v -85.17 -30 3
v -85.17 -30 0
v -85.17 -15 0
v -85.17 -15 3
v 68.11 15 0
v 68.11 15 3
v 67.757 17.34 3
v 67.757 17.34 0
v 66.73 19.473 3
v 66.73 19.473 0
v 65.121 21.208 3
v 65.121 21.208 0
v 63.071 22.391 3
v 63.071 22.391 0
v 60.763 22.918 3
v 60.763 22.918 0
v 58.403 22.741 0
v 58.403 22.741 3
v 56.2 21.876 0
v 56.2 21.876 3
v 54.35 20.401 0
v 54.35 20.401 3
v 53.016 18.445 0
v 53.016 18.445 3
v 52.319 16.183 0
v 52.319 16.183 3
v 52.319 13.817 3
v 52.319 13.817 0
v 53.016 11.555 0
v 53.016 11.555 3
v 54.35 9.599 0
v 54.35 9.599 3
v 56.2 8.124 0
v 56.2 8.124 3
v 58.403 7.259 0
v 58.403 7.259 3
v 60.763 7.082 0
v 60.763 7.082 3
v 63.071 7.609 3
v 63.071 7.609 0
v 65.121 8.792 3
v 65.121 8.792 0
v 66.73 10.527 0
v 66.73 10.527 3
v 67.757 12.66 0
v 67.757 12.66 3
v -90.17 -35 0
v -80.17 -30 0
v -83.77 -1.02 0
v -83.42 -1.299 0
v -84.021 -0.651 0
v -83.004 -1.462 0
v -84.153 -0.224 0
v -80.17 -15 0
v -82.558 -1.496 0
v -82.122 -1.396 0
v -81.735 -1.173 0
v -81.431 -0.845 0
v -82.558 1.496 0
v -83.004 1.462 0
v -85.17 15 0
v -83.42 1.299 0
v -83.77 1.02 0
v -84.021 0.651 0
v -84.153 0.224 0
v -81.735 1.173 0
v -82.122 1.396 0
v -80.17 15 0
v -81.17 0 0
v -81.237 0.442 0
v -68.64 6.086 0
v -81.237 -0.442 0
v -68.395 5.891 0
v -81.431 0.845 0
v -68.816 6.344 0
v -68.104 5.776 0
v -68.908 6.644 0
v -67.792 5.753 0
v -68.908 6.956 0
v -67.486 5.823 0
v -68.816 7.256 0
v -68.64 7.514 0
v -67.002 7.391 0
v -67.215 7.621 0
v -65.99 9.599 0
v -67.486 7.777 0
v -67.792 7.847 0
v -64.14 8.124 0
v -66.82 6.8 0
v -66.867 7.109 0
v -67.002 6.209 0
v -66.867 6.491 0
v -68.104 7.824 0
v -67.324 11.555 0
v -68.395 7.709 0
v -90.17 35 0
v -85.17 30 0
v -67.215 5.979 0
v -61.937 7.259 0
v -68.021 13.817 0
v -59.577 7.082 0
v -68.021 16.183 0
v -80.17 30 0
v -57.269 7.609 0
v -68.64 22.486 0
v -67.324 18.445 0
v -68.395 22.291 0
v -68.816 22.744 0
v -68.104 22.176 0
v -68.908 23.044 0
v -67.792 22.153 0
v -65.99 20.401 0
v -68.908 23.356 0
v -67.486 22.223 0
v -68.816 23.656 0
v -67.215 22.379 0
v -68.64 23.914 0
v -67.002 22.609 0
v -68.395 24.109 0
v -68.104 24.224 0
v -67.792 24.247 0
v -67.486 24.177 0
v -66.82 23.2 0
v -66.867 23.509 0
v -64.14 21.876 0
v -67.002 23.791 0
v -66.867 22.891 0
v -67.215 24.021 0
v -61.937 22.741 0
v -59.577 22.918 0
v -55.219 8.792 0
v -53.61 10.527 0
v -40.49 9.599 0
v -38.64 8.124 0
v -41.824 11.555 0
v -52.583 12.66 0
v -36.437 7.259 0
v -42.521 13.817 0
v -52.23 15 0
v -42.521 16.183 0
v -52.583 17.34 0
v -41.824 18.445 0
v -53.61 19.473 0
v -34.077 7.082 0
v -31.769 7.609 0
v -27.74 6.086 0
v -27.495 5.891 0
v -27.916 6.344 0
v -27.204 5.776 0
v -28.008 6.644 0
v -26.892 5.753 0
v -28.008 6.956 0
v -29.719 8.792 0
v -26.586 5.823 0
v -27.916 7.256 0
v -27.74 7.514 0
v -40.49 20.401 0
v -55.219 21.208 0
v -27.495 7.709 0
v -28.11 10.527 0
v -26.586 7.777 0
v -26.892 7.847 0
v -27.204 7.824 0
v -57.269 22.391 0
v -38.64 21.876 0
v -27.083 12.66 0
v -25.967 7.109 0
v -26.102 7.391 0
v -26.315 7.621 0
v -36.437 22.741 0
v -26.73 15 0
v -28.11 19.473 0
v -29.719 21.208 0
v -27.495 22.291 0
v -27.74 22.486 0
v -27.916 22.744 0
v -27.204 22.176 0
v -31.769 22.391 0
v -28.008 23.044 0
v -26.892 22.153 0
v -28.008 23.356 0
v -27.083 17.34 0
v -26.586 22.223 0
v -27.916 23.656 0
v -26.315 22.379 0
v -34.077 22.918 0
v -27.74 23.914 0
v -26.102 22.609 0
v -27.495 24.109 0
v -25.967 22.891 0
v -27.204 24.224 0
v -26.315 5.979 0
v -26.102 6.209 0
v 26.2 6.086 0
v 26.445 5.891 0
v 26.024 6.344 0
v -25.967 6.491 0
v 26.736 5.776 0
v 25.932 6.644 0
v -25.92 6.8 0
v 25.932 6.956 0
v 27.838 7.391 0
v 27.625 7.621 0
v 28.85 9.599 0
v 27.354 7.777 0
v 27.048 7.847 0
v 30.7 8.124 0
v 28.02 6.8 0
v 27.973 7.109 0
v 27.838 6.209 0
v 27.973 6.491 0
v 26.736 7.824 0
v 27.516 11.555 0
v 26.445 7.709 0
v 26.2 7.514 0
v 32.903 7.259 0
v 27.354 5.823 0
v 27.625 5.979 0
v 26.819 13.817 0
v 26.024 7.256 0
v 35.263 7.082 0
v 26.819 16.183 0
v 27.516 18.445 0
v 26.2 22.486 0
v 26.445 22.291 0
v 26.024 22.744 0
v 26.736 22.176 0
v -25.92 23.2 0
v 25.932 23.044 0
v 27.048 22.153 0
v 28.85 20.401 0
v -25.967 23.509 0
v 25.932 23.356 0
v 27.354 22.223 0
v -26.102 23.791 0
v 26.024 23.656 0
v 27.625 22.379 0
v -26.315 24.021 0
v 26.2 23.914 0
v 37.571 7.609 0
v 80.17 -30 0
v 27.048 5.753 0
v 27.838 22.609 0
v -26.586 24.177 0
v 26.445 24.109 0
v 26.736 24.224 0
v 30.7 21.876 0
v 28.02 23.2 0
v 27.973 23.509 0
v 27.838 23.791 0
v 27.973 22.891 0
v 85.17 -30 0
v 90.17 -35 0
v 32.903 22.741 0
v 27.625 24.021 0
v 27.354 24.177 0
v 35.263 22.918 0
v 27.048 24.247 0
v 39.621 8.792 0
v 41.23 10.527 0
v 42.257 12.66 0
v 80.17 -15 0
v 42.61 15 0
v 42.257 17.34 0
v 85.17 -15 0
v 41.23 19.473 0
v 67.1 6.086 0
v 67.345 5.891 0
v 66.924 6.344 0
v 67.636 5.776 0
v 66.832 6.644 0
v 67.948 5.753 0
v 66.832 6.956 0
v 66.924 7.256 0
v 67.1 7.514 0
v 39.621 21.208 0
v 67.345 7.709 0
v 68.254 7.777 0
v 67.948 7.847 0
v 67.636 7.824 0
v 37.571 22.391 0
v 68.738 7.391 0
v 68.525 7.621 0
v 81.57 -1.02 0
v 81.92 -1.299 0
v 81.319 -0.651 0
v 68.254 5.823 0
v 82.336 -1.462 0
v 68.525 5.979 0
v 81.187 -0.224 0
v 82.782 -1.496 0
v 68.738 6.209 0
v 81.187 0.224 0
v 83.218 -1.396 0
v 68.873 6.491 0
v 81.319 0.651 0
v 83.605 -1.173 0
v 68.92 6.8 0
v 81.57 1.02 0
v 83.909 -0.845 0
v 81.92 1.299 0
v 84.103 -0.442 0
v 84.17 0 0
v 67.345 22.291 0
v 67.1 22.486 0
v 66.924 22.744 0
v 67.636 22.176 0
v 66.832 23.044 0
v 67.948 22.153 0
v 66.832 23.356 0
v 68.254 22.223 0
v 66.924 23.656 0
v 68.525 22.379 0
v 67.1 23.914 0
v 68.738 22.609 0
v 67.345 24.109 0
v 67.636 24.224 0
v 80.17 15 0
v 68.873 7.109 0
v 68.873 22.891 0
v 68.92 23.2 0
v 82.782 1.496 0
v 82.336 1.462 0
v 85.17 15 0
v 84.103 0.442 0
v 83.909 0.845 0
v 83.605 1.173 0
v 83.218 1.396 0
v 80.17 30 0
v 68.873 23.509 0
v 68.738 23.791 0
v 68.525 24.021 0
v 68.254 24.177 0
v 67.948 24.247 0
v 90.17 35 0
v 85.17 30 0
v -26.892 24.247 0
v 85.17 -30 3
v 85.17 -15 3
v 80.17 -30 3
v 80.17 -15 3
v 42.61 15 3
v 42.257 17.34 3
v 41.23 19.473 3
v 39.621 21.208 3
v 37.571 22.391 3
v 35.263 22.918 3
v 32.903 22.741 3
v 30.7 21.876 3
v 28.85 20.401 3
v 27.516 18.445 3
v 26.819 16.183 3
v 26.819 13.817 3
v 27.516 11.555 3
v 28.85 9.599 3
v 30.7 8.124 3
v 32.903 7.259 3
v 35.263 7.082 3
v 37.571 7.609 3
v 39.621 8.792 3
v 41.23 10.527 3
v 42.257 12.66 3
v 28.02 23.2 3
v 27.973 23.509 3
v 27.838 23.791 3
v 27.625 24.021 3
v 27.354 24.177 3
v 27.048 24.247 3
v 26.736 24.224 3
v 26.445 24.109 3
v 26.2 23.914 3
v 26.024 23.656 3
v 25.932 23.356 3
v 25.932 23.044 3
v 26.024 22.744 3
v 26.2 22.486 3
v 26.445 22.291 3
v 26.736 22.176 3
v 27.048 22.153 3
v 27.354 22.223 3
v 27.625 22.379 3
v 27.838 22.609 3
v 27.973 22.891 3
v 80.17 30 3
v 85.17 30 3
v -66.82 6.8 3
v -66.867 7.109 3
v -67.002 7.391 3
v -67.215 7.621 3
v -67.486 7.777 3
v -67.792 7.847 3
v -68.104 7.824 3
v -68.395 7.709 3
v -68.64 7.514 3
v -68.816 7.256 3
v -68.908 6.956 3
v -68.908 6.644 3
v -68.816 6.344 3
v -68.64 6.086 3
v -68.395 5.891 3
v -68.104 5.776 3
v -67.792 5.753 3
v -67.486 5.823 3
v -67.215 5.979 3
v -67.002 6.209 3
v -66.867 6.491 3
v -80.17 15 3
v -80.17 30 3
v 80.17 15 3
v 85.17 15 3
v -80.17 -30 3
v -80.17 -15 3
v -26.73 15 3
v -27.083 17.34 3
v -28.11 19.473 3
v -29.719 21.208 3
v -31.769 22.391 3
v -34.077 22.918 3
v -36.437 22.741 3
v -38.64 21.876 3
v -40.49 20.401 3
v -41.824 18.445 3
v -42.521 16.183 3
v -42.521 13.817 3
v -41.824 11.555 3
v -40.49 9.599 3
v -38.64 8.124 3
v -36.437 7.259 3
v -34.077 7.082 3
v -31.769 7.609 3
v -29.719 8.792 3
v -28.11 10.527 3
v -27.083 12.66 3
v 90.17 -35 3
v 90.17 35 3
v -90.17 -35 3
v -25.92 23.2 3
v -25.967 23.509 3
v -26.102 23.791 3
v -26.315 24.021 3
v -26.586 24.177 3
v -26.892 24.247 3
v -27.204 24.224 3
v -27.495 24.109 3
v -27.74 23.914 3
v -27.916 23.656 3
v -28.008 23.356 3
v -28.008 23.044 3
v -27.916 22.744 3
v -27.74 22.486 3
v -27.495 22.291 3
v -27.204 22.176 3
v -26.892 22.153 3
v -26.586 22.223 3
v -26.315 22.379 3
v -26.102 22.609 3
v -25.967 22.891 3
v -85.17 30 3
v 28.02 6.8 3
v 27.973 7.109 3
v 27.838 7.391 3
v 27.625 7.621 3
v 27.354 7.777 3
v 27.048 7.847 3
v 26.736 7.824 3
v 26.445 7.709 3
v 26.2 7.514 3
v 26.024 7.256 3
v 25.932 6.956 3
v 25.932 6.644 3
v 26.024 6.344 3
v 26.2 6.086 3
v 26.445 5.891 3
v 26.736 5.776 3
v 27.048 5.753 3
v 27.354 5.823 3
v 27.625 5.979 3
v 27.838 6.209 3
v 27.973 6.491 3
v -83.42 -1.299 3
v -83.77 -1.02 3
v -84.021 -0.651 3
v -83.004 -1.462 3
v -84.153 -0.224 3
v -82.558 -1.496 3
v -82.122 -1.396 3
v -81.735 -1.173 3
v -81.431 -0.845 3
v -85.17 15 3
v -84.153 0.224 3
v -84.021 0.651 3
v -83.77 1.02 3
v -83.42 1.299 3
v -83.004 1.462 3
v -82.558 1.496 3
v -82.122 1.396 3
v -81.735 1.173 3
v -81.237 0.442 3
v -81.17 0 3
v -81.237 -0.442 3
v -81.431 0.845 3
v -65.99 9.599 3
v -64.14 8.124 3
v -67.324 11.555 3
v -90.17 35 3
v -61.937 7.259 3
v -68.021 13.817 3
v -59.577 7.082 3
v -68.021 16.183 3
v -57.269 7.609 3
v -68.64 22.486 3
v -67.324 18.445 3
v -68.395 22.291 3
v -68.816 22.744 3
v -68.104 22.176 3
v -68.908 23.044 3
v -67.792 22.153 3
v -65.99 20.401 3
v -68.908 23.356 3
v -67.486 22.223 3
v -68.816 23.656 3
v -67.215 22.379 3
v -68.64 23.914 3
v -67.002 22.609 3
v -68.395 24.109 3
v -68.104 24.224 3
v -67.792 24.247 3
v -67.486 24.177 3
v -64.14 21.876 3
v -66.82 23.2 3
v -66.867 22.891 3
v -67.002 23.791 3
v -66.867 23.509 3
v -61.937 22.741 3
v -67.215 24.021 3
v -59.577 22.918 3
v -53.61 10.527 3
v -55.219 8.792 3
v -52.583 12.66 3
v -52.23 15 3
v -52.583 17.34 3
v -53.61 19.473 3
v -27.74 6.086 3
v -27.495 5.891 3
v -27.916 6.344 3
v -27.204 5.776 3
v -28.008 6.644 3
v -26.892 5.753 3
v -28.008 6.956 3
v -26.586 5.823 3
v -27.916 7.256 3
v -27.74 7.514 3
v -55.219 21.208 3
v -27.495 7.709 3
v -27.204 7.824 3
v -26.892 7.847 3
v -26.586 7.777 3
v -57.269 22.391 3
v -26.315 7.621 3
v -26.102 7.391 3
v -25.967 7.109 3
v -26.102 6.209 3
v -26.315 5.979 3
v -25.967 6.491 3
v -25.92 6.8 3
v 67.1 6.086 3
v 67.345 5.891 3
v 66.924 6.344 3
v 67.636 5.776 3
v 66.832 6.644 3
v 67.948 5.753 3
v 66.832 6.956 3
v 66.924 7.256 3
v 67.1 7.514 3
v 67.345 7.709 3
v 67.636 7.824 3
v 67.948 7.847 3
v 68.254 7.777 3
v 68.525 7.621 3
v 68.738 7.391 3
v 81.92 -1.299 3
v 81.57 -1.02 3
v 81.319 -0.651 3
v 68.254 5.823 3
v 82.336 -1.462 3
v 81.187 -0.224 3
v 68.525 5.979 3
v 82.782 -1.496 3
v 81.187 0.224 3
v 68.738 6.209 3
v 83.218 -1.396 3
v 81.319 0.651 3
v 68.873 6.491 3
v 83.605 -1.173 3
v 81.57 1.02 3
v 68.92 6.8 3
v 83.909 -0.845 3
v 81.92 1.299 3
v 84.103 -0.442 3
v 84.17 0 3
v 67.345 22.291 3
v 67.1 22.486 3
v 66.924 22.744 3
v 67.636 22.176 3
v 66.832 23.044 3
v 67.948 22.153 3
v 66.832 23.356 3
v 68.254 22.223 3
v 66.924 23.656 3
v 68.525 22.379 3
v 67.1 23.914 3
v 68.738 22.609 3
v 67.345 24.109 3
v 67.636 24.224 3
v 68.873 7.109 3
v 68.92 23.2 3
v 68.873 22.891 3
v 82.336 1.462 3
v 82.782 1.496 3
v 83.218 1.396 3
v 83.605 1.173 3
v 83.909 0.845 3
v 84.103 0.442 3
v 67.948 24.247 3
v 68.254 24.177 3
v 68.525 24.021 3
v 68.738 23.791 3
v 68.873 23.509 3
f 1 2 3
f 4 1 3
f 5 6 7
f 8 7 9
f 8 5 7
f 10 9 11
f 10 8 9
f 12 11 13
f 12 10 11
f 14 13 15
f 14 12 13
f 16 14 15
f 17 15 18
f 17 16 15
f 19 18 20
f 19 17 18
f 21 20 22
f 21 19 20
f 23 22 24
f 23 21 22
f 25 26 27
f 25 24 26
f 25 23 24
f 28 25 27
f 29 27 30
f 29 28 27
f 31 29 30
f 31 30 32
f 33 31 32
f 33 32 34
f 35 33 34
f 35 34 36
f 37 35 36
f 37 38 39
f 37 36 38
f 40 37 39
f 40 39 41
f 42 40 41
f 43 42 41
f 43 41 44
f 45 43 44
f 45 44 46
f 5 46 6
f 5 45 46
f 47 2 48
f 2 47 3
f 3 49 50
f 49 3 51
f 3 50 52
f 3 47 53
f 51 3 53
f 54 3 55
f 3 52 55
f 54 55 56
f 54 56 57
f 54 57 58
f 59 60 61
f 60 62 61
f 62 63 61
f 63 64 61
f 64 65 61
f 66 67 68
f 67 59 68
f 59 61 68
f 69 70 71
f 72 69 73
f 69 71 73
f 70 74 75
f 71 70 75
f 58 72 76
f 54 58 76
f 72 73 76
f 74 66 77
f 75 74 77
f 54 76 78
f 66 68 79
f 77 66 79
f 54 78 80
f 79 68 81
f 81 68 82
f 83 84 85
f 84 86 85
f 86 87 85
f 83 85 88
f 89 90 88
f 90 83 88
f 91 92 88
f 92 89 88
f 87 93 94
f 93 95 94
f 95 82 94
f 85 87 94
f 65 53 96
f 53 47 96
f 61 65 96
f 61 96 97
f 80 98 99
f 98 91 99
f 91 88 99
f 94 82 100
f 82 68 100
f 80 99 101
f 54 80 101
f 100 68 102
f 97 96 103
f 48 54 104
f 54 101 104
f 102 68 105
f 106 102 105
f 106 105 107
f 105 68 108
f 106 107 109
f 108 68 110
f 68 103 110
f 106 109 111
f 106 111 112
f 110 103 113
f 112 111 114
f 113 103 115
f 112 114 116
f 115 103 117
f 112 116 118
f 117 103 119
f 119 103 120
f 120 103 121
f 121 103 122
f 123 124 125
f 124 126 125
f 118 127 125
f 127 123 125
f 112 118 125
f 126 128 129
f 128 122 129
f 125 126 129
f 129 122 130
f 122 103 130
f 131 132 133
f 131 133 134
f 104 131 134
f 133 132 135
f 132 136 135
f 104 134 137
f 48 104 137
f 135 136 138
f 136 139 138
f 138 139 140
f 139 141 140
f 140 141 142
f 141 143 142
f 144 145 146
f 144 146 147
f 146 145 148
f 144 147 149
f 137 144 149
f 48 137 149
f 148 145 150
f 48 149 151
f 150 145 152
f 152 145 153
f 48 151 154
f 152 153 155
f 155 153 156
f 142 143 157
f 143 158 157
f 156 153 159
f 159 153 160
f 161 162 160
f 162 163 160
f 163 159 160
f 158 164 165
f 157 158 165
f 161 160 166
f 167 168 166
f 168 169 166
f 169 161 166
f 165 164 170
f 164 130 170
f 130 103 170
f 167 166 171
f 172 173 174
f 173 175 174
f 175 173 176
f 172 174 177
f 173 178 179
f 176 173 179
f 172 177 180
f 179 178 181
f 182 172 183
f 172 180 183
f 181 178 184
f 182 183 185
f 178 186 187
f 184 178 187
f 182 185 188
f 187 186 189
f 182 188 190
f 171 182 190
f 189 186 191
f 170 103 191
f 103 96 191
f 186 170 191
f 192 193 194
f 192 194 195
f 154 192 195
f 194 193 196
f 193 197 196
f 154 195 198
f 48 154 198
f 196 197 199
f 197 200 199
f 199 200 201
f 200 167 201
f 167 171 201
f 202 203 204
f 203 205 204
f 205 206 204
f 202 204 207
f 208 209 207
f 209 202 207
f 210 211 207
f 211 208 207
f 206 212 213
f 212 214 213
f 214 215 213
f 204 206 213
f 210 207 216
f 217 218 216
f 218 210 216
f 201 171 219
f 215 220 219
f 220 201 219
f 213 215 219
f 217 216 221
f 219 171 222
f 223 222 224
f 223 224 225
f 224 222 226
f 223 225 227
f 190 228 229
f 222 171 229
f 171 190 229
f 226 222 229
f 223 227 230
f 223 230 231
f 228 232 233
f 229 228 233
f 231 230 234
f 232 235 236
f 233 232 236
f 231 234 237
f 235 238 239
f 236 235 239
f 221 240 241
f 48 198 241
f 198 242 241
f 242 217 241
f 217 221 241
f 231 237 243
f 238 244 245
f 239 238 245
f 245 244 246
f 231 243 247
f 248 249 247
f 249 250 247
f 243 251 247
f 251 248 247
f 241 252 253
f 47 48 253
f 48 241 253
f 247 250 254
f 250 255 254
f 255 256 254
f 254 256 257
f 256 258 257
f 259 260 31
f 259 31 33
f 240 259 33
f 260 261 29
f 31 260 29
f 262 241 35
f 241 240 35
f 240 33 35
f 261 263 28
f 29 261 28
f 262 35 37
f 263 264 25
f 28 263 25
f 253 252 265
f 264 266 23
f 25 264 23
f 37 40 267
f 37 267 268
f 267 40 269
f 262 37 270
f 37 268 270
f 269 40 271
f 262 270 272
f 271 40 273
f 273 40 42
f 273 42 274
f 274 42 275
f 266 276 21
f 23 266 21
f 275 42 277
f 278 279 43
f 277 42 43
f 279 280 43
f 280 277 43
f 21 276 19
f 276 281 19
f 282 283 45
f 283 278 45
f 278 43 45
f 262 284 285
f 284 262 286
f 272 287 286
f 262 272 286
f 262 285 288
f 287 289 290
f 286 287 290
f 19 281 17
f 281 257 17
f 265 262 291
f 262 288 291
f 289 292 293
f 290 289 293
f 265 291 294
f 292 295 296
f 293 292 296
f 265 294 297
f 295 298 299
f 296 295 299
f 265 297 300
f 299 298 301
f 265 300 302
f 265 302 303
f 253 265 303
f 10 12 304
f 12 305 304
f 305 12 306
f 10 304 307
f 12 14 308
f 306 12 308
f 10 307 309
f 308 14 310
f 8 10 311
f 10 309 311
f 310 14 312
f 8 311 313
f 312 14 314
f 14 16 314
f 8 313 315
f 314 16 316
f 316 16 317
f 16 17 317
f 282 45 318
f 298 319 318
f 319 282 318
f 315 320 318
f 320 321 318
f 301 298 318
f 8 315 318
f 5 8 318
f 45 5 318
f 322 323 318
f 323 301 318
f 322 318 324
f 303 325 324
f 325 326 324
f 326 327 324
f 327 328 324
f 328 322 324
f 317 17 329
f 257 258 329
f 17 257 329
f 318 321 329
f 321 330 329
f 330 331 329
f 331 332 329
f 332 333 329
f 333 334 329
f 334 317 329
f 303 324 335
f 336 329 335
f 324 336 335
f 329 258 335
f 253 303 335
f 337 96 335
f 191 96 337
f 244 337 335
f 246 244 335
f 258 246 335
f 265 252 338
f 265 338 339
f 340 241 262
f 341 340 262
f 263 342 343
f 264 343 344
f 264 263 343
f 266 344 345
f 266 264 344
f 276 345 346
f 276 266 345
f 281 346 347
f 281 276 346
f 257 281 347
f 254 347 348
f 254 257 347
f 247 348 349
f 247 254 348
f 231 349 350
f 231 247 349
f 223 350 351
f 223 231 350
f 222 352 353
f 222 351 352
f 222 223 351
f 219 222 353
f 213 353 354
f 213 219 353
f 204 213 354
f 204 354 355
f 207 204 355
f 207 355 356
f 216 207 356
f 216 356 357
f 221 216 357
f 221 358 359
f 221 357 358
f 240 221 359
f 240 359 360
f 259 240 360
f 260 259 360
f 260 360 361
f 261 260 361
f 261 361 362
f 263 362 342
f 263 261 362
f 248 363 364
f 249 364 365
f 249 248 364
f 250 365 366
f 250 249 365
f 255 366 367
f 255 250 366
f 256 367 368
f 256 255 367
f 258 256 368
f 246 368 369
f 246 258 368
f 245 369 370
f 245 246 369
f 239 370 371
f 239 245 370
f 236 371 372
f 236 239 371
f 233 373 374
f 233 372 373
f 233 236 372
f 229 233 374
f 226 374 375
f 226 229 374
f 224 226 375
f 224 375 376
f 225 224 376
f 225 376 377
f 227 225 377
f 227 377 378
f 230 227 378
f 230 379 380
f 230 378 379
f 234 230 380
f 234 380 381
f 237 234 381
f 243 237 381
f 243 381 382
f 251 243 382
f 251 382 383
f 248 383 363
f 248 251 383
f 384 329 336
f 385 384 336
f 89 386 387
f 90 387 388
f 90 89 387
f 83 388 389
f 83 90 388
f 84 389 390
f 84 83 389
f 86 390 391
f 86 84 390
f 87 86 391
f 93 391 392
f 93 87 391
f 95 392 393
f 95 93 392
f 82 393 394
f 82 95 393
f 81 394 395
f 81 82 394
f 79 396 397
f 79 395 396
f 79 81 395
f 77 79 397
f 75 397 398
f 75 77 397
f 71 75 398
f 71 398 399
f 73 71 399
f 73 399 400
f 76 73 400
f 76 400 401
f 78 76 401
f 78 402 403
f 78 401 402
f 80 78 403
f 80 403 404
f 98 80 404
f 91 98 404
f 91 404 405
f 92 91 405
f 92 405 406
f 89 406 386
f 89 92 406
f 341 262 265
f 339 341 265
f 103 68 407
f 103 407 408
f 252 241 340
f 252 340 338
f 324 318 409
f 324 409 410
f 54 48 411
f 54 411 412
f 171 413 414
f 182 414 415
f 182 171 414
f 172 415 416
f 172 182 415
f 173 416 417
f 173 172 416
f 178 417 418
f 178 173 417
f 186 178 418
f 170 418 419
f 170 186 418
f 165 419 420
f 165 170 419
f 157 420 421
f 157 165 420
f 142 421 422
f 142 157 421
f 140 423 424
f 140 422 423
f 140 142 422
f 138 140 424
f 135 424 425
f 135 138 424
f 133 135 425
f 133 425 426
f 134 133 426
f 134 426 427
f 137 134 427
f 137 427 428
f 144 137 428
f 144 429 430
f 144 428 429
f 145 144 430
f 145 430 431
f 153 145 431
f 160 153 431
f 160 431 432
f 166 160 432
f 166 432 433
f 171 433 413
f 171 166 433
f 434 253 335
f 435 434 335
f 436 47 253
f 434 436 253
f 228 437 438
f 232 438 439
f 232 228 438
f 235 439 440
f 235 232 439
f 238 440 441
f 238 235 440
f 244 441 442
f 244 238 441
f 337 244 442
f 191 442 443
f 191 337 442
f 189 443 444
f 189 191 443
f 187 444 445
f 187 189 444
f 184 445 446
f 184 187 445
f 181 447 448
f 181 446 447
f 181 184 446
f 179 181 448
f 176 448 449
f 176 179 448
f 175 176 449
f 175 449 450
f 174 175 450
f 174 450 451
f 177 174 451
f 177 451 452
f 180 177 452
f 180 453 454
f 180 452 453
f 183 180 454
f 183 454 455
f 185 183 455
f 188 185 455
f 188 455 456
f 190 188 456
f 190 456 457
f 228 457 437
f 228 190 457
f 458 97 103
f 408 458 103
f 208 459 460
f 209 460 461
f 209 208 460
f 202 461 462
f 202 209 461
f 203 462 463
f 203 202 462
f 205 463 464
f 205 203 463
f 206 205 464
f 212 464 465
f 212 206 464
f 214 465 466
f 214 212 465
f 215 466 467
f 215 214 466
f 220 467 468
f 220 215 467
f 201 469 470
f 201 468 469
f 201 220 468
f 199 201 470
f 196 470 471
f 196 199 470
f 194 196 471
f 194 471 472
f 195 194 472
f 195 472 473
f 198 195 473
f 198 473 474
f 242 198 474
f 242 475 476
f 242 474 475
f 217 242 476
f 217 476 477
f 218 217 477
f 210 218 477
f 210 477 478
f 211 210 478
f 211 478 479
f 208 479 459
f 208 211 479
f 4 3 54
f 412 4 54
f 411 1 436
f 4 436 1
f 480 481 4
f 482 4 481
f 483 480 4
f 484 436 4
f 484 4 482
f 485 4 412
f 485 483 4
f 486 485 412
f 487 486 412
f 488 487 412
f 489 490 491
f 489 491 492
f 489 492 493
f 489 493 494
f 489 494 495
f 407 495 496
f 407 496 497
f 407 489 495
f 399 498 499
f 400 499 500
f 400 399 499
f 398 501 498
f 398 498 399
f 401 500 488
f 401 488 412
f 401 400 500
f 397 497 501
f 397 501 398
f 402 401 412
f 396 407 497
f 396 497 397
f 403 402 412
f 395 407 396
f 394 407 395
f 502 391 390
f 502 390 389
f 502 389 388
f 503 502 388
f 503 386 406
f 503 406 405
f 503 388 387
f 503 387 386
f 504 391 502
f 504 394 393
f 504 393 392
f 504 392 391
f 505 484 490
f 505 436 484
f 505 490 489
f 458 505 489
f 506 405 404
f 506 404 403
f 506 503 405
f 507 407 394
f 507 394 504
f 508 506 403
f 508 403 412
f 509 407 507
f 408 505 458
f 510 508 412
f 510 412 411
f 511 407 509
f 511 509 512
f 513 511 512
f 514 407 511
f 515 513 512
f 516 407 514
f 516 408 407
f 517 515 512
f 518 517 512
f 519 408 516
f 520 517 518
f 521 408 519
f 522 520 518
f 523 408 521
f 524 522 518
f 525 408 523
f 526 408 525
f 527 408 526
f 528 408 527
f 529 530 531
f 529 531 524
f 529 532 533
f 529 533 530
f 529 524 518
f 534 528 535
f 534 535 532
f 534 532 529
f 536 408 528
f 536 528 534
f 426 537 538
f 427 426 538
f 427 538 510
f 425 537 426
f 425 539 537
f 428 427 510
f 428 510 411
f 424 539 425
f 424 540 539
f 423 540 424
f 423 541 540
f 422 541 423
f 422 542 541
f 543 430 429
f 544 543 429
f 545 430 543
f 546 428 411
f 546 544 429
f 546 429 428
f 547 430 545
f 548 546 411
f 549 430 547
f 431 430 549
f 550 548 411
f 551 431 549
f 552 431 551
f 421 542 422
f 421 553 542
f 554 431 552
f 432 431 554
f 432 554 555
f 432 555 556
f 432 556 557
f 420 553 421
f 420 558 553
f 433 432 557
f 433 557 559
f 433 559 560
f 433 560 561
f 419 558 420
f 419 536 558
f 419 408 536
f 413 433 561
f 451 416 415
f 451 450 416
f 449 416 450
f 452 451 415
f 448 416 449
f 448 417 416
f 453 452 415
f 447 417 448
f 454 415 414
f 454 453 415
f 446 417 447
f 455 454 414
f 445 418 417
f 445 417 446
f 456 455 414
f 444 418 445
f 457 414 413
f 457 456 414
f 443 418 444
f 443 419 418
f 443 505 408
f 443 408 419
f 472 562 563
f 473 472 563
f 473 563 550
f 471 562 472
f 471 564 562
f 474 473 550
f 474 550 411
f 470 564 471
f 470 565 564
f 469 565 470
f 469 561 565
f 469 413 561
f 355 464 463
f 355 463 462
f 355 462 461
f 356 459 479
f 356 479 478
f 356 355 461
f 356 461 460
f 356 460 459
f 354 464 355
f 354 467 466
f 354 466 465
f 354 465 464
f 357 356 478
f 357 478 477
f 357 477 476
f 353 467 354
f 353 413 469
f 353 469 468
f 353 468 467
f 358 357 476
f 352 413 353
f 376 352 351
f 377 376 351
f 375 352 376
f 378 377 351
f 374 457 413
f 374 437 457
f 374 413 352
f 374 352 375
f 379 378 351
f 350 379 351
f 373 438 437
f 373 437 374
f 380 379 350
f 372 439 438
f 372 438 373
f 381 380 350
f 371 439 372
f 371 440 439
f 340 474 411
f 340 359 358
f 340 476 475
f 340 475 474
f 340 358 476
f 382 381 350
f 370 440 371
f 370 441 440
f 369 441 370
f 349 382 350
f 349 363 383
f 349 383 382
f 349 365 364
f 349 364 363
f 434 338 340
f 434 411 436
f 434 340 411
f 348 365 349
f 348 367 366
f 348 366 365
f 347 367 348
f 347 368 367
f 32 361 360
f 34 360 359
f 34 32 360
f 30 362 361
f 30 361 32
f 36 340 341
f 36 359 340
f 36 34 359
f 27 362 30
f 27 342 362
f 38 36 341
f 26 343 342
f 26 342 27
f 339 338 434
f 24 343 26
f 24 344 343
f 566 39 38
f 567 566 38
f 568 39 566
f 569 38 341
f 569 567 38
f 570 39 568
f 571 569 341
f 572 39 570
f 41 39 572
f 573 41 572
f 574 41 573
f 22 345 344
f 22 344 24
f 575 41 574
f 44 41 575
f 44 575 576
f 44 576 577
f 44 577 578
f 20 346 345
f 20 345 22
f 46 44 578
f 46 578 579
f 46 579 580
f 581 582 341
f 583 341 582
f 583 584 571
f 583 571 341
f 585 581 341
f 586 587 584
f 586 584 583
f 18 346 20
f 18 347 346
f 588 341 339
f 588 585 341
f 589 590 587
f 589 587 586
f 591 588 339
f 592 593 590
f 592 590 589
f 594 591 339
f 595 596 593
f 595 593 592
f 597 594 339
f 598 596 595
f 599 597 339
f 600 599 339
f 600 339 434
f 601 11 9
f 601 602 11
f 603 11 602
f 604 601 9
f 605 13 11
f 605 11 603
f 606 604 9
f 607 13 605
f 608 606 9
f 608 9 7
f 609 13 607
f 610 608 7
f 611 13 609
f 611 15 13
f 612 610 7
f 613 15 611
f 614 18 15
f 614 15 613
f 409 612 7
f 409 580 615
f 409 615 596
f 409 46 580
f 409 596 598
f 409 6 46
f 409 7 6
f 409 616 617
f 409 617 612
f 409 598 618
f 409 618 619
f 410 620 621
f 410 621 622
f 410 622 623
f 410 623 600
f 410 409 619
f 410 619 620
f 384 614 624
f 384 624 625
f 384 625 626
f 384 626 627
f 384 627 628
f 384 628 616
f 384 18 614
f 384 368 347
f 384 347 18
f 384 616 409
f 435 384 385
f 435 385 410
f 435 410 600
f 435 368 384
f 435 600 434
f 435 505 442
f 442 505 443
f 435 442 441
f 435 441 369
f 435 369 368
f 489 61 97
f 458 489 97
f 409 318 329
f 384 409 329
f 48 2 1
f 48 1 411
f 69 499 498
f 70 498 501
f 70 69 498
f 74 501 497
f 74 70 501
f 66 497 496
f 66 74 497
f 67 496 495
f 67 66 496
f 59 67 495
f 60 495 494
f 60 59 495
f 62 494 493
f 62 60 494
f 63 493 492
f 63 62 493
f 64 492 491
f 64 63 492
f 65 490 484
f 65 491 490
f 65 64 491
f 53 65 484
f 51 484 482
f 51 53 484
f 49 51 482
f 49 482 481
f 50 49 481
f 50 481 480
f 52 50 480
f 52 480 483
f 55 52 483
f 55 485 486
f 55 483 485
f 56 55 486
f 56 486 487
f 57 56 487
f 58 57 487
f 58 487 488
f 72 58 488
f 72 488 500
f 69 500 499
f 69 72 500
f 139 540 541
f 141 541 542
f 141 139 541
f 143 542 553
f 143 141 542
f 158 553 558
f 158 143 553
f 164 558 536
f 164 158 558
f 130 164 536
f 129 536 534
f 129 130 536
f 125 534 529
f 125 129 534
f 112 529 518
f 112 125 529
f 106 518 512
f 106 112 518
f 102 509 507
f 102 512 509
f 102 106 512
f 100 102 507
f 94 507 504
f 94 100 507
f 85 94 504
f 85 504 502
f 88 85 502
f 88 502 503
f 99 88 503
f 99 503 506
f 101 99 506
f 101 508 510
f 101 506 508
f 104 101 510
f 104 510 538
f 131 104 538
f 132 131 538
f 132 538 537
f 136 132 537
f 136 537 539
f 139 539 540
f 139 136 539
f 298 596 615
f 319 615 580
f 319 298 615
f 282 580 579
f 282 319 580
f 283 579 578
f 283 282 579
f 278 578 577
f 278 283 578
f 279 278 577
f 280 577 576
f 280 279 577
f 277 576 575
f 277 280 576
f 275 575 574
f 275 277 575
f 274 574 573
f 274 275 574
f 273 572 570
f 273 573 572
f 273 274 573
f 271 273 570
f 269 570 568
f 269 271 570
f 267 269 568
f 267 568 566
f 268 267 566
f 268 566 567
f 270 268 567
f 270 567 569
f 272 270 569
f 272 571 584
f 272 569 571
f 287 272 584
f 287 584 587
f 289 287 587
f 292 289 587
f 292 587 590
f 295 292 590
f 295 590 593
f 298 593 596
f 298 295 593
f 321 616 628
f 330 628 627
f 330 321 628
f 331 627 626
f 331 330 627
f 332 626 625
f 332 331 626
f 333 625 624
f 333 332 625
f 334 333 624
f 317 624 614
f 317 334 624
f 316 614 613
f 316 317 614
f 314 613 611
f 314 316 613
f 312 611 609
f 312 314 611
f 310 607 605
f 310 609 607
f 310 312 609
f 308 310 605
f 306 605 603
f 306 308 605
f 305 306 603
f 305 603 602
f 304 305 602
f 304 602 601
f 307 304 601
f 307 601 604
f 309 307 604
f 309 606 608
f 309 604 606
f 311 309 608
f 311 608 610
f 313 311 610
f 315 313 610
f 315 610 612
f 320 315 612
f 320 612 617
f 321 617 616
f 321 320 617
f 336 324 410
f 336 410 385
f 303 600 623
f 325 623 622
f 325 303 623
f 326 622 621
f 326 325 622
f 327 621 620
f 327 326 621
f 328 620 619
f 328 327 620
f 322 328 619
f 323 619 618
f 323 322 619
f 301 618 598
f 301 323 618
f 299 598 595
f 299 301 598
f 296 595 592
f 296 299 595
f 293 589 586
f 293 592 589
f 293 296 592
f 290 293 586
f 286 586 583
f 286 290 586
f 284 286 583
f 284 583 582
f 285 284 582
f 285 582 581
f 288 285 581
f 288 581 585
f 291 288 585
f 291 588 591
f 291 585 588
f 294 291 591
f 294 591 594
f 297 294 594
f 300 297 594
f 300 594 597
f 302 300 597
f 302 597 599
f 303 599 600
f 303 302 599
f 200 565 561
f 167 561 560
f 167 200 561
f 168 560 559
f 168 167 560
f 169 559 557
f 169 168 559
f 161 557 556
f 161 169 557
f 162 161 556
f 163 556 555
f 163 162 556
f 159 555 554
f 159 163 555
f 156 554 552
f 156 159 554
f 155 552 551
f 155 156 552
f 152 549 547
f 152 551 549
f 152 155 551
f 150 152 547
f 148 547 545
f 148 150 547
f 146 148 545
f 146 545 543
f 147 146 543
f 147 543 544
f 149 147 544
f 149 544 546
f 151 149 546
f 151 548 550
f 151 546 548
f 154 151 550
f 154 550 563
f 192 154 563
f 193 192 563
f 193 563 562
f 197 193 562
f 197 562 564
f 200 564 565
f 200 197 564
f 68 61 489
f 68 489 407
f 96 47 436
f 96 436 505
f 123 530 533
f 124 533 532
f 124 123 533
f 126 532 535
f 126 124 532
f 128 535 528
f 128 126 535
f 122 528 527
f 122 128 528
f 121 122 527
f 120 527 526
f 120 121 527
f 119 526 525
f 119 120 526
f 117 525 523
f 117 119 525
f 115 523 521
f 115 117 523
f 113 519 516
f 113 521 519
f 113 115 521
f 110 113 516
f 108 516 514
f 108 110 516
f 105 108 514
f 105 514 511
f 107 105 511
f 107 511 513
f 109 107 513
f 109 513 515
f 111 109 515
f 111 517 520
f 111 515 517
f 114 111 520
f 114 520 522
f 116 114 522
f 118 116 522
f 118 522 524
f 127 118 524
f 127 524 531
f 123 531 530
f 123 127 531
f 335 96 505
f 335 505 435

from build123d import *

# Parameters (mm, degrees)
SCHIZZO1_W                   = 180.34
SCHIZZO1_H                   = 70
ESTRUSIONE_ESTRUSIONE1_DEPTH = 3
SCHIZZO2_R                   = 1.5
SCHIZZO2_W                   = 5
SCHIZZO2_H                   = 15
TAGLIO_ESTRUSIONE1_DEPTH     = 4
SCHIZZO3_R                   = 7.94
SCHIZZO3_R_2                 = 1.05
TAGLIO_ESTRUSIONE2_DEPTH     = 4


with BuildPart() as part:
    # Schizzo1 → Estrusione-Estrusione1 (new body)
    with BuildSketch(Plane.XY):
        Rectangle(SCHIZZO1_W, SCHIZZO1_H)
    extrude(amount=ESTRUSIONE_ESTRUSIONE1_DEPTH)

    # Schizzo2 → Taglio-Estrusione1 (cut, through all)
    with BuildSketch(Plane.XY):
        with Locations((-82.67, 0)):
            Circle(SCHIZZO2_R)
        with Locations((82.67, 0)):
            Circle(SCHIZZO2_R)
        with Locations((-82.67, 22.5)):
            Rectangle(SCHIZZO2_W, SCHIZZO2_H)
        with Locations((-82.67, -22.5)):
            Rectangle(SCHIZZO2_W, SCHIZZO2_H)
        with Locations((82.67, 22.5)):
            Rectangle(SCHIZZO2_W, SCHIZZO2_H)
        with Locations((82.67, -22.5)):
            Rectangle(SCHIZZO2_W, SCHIZZO2_H)
    extrude(amount=TAGLIO_ESTRUSIONE1_DEPTH, mode=Mode.SUBTRACT)

    # Schizzo3 → Taglio-Estrusione2 (cut, through all)
    with BuildSketch(Plane.XY):
        with Locations((-60.17, 15)):
            Circle(SCHIZZO3_R)
        with Locations((-34.67, 15)):
            Circle(SCHIZZO3_R)
        with Locations((60.17, 15)):
            Circle(SCHIZZO3_R)
        with Locations((34.67, 15)):
            Circle(SCHIZZO3_R)
        with Locations((-26.97, 6.8)):
            Circle(SCHIZZO3_R_2)
        with Locations((-26.97, 23.2)):
            Circle(SCHIZZO3_R_2)
        with Locations((-67.87, 6.8)):
            Circle(SCHIZZO3_R_2)
        with Locations((-67.87, 23.2)):
            Circle(SCHIZZO3_R_2)
        with Locations((26.97, 23.2)):
            Circle(SCHIZZO3_R_2)
        with Locations((26.97, 6.8)):
            Circle(SCHIZZO3_R_2)
        with Locations((67.87, 6.8)):
            Circle(SCHIZZO3_R_2)
        with Locations((67.87, 23.2)):
            Circle(SCHIZZO3_R_2)
    extrude(amount=TAGLIO_ESTRUSIONE2_DEPTH, mode=Mode.SUBTRACT)


solid = part.part
